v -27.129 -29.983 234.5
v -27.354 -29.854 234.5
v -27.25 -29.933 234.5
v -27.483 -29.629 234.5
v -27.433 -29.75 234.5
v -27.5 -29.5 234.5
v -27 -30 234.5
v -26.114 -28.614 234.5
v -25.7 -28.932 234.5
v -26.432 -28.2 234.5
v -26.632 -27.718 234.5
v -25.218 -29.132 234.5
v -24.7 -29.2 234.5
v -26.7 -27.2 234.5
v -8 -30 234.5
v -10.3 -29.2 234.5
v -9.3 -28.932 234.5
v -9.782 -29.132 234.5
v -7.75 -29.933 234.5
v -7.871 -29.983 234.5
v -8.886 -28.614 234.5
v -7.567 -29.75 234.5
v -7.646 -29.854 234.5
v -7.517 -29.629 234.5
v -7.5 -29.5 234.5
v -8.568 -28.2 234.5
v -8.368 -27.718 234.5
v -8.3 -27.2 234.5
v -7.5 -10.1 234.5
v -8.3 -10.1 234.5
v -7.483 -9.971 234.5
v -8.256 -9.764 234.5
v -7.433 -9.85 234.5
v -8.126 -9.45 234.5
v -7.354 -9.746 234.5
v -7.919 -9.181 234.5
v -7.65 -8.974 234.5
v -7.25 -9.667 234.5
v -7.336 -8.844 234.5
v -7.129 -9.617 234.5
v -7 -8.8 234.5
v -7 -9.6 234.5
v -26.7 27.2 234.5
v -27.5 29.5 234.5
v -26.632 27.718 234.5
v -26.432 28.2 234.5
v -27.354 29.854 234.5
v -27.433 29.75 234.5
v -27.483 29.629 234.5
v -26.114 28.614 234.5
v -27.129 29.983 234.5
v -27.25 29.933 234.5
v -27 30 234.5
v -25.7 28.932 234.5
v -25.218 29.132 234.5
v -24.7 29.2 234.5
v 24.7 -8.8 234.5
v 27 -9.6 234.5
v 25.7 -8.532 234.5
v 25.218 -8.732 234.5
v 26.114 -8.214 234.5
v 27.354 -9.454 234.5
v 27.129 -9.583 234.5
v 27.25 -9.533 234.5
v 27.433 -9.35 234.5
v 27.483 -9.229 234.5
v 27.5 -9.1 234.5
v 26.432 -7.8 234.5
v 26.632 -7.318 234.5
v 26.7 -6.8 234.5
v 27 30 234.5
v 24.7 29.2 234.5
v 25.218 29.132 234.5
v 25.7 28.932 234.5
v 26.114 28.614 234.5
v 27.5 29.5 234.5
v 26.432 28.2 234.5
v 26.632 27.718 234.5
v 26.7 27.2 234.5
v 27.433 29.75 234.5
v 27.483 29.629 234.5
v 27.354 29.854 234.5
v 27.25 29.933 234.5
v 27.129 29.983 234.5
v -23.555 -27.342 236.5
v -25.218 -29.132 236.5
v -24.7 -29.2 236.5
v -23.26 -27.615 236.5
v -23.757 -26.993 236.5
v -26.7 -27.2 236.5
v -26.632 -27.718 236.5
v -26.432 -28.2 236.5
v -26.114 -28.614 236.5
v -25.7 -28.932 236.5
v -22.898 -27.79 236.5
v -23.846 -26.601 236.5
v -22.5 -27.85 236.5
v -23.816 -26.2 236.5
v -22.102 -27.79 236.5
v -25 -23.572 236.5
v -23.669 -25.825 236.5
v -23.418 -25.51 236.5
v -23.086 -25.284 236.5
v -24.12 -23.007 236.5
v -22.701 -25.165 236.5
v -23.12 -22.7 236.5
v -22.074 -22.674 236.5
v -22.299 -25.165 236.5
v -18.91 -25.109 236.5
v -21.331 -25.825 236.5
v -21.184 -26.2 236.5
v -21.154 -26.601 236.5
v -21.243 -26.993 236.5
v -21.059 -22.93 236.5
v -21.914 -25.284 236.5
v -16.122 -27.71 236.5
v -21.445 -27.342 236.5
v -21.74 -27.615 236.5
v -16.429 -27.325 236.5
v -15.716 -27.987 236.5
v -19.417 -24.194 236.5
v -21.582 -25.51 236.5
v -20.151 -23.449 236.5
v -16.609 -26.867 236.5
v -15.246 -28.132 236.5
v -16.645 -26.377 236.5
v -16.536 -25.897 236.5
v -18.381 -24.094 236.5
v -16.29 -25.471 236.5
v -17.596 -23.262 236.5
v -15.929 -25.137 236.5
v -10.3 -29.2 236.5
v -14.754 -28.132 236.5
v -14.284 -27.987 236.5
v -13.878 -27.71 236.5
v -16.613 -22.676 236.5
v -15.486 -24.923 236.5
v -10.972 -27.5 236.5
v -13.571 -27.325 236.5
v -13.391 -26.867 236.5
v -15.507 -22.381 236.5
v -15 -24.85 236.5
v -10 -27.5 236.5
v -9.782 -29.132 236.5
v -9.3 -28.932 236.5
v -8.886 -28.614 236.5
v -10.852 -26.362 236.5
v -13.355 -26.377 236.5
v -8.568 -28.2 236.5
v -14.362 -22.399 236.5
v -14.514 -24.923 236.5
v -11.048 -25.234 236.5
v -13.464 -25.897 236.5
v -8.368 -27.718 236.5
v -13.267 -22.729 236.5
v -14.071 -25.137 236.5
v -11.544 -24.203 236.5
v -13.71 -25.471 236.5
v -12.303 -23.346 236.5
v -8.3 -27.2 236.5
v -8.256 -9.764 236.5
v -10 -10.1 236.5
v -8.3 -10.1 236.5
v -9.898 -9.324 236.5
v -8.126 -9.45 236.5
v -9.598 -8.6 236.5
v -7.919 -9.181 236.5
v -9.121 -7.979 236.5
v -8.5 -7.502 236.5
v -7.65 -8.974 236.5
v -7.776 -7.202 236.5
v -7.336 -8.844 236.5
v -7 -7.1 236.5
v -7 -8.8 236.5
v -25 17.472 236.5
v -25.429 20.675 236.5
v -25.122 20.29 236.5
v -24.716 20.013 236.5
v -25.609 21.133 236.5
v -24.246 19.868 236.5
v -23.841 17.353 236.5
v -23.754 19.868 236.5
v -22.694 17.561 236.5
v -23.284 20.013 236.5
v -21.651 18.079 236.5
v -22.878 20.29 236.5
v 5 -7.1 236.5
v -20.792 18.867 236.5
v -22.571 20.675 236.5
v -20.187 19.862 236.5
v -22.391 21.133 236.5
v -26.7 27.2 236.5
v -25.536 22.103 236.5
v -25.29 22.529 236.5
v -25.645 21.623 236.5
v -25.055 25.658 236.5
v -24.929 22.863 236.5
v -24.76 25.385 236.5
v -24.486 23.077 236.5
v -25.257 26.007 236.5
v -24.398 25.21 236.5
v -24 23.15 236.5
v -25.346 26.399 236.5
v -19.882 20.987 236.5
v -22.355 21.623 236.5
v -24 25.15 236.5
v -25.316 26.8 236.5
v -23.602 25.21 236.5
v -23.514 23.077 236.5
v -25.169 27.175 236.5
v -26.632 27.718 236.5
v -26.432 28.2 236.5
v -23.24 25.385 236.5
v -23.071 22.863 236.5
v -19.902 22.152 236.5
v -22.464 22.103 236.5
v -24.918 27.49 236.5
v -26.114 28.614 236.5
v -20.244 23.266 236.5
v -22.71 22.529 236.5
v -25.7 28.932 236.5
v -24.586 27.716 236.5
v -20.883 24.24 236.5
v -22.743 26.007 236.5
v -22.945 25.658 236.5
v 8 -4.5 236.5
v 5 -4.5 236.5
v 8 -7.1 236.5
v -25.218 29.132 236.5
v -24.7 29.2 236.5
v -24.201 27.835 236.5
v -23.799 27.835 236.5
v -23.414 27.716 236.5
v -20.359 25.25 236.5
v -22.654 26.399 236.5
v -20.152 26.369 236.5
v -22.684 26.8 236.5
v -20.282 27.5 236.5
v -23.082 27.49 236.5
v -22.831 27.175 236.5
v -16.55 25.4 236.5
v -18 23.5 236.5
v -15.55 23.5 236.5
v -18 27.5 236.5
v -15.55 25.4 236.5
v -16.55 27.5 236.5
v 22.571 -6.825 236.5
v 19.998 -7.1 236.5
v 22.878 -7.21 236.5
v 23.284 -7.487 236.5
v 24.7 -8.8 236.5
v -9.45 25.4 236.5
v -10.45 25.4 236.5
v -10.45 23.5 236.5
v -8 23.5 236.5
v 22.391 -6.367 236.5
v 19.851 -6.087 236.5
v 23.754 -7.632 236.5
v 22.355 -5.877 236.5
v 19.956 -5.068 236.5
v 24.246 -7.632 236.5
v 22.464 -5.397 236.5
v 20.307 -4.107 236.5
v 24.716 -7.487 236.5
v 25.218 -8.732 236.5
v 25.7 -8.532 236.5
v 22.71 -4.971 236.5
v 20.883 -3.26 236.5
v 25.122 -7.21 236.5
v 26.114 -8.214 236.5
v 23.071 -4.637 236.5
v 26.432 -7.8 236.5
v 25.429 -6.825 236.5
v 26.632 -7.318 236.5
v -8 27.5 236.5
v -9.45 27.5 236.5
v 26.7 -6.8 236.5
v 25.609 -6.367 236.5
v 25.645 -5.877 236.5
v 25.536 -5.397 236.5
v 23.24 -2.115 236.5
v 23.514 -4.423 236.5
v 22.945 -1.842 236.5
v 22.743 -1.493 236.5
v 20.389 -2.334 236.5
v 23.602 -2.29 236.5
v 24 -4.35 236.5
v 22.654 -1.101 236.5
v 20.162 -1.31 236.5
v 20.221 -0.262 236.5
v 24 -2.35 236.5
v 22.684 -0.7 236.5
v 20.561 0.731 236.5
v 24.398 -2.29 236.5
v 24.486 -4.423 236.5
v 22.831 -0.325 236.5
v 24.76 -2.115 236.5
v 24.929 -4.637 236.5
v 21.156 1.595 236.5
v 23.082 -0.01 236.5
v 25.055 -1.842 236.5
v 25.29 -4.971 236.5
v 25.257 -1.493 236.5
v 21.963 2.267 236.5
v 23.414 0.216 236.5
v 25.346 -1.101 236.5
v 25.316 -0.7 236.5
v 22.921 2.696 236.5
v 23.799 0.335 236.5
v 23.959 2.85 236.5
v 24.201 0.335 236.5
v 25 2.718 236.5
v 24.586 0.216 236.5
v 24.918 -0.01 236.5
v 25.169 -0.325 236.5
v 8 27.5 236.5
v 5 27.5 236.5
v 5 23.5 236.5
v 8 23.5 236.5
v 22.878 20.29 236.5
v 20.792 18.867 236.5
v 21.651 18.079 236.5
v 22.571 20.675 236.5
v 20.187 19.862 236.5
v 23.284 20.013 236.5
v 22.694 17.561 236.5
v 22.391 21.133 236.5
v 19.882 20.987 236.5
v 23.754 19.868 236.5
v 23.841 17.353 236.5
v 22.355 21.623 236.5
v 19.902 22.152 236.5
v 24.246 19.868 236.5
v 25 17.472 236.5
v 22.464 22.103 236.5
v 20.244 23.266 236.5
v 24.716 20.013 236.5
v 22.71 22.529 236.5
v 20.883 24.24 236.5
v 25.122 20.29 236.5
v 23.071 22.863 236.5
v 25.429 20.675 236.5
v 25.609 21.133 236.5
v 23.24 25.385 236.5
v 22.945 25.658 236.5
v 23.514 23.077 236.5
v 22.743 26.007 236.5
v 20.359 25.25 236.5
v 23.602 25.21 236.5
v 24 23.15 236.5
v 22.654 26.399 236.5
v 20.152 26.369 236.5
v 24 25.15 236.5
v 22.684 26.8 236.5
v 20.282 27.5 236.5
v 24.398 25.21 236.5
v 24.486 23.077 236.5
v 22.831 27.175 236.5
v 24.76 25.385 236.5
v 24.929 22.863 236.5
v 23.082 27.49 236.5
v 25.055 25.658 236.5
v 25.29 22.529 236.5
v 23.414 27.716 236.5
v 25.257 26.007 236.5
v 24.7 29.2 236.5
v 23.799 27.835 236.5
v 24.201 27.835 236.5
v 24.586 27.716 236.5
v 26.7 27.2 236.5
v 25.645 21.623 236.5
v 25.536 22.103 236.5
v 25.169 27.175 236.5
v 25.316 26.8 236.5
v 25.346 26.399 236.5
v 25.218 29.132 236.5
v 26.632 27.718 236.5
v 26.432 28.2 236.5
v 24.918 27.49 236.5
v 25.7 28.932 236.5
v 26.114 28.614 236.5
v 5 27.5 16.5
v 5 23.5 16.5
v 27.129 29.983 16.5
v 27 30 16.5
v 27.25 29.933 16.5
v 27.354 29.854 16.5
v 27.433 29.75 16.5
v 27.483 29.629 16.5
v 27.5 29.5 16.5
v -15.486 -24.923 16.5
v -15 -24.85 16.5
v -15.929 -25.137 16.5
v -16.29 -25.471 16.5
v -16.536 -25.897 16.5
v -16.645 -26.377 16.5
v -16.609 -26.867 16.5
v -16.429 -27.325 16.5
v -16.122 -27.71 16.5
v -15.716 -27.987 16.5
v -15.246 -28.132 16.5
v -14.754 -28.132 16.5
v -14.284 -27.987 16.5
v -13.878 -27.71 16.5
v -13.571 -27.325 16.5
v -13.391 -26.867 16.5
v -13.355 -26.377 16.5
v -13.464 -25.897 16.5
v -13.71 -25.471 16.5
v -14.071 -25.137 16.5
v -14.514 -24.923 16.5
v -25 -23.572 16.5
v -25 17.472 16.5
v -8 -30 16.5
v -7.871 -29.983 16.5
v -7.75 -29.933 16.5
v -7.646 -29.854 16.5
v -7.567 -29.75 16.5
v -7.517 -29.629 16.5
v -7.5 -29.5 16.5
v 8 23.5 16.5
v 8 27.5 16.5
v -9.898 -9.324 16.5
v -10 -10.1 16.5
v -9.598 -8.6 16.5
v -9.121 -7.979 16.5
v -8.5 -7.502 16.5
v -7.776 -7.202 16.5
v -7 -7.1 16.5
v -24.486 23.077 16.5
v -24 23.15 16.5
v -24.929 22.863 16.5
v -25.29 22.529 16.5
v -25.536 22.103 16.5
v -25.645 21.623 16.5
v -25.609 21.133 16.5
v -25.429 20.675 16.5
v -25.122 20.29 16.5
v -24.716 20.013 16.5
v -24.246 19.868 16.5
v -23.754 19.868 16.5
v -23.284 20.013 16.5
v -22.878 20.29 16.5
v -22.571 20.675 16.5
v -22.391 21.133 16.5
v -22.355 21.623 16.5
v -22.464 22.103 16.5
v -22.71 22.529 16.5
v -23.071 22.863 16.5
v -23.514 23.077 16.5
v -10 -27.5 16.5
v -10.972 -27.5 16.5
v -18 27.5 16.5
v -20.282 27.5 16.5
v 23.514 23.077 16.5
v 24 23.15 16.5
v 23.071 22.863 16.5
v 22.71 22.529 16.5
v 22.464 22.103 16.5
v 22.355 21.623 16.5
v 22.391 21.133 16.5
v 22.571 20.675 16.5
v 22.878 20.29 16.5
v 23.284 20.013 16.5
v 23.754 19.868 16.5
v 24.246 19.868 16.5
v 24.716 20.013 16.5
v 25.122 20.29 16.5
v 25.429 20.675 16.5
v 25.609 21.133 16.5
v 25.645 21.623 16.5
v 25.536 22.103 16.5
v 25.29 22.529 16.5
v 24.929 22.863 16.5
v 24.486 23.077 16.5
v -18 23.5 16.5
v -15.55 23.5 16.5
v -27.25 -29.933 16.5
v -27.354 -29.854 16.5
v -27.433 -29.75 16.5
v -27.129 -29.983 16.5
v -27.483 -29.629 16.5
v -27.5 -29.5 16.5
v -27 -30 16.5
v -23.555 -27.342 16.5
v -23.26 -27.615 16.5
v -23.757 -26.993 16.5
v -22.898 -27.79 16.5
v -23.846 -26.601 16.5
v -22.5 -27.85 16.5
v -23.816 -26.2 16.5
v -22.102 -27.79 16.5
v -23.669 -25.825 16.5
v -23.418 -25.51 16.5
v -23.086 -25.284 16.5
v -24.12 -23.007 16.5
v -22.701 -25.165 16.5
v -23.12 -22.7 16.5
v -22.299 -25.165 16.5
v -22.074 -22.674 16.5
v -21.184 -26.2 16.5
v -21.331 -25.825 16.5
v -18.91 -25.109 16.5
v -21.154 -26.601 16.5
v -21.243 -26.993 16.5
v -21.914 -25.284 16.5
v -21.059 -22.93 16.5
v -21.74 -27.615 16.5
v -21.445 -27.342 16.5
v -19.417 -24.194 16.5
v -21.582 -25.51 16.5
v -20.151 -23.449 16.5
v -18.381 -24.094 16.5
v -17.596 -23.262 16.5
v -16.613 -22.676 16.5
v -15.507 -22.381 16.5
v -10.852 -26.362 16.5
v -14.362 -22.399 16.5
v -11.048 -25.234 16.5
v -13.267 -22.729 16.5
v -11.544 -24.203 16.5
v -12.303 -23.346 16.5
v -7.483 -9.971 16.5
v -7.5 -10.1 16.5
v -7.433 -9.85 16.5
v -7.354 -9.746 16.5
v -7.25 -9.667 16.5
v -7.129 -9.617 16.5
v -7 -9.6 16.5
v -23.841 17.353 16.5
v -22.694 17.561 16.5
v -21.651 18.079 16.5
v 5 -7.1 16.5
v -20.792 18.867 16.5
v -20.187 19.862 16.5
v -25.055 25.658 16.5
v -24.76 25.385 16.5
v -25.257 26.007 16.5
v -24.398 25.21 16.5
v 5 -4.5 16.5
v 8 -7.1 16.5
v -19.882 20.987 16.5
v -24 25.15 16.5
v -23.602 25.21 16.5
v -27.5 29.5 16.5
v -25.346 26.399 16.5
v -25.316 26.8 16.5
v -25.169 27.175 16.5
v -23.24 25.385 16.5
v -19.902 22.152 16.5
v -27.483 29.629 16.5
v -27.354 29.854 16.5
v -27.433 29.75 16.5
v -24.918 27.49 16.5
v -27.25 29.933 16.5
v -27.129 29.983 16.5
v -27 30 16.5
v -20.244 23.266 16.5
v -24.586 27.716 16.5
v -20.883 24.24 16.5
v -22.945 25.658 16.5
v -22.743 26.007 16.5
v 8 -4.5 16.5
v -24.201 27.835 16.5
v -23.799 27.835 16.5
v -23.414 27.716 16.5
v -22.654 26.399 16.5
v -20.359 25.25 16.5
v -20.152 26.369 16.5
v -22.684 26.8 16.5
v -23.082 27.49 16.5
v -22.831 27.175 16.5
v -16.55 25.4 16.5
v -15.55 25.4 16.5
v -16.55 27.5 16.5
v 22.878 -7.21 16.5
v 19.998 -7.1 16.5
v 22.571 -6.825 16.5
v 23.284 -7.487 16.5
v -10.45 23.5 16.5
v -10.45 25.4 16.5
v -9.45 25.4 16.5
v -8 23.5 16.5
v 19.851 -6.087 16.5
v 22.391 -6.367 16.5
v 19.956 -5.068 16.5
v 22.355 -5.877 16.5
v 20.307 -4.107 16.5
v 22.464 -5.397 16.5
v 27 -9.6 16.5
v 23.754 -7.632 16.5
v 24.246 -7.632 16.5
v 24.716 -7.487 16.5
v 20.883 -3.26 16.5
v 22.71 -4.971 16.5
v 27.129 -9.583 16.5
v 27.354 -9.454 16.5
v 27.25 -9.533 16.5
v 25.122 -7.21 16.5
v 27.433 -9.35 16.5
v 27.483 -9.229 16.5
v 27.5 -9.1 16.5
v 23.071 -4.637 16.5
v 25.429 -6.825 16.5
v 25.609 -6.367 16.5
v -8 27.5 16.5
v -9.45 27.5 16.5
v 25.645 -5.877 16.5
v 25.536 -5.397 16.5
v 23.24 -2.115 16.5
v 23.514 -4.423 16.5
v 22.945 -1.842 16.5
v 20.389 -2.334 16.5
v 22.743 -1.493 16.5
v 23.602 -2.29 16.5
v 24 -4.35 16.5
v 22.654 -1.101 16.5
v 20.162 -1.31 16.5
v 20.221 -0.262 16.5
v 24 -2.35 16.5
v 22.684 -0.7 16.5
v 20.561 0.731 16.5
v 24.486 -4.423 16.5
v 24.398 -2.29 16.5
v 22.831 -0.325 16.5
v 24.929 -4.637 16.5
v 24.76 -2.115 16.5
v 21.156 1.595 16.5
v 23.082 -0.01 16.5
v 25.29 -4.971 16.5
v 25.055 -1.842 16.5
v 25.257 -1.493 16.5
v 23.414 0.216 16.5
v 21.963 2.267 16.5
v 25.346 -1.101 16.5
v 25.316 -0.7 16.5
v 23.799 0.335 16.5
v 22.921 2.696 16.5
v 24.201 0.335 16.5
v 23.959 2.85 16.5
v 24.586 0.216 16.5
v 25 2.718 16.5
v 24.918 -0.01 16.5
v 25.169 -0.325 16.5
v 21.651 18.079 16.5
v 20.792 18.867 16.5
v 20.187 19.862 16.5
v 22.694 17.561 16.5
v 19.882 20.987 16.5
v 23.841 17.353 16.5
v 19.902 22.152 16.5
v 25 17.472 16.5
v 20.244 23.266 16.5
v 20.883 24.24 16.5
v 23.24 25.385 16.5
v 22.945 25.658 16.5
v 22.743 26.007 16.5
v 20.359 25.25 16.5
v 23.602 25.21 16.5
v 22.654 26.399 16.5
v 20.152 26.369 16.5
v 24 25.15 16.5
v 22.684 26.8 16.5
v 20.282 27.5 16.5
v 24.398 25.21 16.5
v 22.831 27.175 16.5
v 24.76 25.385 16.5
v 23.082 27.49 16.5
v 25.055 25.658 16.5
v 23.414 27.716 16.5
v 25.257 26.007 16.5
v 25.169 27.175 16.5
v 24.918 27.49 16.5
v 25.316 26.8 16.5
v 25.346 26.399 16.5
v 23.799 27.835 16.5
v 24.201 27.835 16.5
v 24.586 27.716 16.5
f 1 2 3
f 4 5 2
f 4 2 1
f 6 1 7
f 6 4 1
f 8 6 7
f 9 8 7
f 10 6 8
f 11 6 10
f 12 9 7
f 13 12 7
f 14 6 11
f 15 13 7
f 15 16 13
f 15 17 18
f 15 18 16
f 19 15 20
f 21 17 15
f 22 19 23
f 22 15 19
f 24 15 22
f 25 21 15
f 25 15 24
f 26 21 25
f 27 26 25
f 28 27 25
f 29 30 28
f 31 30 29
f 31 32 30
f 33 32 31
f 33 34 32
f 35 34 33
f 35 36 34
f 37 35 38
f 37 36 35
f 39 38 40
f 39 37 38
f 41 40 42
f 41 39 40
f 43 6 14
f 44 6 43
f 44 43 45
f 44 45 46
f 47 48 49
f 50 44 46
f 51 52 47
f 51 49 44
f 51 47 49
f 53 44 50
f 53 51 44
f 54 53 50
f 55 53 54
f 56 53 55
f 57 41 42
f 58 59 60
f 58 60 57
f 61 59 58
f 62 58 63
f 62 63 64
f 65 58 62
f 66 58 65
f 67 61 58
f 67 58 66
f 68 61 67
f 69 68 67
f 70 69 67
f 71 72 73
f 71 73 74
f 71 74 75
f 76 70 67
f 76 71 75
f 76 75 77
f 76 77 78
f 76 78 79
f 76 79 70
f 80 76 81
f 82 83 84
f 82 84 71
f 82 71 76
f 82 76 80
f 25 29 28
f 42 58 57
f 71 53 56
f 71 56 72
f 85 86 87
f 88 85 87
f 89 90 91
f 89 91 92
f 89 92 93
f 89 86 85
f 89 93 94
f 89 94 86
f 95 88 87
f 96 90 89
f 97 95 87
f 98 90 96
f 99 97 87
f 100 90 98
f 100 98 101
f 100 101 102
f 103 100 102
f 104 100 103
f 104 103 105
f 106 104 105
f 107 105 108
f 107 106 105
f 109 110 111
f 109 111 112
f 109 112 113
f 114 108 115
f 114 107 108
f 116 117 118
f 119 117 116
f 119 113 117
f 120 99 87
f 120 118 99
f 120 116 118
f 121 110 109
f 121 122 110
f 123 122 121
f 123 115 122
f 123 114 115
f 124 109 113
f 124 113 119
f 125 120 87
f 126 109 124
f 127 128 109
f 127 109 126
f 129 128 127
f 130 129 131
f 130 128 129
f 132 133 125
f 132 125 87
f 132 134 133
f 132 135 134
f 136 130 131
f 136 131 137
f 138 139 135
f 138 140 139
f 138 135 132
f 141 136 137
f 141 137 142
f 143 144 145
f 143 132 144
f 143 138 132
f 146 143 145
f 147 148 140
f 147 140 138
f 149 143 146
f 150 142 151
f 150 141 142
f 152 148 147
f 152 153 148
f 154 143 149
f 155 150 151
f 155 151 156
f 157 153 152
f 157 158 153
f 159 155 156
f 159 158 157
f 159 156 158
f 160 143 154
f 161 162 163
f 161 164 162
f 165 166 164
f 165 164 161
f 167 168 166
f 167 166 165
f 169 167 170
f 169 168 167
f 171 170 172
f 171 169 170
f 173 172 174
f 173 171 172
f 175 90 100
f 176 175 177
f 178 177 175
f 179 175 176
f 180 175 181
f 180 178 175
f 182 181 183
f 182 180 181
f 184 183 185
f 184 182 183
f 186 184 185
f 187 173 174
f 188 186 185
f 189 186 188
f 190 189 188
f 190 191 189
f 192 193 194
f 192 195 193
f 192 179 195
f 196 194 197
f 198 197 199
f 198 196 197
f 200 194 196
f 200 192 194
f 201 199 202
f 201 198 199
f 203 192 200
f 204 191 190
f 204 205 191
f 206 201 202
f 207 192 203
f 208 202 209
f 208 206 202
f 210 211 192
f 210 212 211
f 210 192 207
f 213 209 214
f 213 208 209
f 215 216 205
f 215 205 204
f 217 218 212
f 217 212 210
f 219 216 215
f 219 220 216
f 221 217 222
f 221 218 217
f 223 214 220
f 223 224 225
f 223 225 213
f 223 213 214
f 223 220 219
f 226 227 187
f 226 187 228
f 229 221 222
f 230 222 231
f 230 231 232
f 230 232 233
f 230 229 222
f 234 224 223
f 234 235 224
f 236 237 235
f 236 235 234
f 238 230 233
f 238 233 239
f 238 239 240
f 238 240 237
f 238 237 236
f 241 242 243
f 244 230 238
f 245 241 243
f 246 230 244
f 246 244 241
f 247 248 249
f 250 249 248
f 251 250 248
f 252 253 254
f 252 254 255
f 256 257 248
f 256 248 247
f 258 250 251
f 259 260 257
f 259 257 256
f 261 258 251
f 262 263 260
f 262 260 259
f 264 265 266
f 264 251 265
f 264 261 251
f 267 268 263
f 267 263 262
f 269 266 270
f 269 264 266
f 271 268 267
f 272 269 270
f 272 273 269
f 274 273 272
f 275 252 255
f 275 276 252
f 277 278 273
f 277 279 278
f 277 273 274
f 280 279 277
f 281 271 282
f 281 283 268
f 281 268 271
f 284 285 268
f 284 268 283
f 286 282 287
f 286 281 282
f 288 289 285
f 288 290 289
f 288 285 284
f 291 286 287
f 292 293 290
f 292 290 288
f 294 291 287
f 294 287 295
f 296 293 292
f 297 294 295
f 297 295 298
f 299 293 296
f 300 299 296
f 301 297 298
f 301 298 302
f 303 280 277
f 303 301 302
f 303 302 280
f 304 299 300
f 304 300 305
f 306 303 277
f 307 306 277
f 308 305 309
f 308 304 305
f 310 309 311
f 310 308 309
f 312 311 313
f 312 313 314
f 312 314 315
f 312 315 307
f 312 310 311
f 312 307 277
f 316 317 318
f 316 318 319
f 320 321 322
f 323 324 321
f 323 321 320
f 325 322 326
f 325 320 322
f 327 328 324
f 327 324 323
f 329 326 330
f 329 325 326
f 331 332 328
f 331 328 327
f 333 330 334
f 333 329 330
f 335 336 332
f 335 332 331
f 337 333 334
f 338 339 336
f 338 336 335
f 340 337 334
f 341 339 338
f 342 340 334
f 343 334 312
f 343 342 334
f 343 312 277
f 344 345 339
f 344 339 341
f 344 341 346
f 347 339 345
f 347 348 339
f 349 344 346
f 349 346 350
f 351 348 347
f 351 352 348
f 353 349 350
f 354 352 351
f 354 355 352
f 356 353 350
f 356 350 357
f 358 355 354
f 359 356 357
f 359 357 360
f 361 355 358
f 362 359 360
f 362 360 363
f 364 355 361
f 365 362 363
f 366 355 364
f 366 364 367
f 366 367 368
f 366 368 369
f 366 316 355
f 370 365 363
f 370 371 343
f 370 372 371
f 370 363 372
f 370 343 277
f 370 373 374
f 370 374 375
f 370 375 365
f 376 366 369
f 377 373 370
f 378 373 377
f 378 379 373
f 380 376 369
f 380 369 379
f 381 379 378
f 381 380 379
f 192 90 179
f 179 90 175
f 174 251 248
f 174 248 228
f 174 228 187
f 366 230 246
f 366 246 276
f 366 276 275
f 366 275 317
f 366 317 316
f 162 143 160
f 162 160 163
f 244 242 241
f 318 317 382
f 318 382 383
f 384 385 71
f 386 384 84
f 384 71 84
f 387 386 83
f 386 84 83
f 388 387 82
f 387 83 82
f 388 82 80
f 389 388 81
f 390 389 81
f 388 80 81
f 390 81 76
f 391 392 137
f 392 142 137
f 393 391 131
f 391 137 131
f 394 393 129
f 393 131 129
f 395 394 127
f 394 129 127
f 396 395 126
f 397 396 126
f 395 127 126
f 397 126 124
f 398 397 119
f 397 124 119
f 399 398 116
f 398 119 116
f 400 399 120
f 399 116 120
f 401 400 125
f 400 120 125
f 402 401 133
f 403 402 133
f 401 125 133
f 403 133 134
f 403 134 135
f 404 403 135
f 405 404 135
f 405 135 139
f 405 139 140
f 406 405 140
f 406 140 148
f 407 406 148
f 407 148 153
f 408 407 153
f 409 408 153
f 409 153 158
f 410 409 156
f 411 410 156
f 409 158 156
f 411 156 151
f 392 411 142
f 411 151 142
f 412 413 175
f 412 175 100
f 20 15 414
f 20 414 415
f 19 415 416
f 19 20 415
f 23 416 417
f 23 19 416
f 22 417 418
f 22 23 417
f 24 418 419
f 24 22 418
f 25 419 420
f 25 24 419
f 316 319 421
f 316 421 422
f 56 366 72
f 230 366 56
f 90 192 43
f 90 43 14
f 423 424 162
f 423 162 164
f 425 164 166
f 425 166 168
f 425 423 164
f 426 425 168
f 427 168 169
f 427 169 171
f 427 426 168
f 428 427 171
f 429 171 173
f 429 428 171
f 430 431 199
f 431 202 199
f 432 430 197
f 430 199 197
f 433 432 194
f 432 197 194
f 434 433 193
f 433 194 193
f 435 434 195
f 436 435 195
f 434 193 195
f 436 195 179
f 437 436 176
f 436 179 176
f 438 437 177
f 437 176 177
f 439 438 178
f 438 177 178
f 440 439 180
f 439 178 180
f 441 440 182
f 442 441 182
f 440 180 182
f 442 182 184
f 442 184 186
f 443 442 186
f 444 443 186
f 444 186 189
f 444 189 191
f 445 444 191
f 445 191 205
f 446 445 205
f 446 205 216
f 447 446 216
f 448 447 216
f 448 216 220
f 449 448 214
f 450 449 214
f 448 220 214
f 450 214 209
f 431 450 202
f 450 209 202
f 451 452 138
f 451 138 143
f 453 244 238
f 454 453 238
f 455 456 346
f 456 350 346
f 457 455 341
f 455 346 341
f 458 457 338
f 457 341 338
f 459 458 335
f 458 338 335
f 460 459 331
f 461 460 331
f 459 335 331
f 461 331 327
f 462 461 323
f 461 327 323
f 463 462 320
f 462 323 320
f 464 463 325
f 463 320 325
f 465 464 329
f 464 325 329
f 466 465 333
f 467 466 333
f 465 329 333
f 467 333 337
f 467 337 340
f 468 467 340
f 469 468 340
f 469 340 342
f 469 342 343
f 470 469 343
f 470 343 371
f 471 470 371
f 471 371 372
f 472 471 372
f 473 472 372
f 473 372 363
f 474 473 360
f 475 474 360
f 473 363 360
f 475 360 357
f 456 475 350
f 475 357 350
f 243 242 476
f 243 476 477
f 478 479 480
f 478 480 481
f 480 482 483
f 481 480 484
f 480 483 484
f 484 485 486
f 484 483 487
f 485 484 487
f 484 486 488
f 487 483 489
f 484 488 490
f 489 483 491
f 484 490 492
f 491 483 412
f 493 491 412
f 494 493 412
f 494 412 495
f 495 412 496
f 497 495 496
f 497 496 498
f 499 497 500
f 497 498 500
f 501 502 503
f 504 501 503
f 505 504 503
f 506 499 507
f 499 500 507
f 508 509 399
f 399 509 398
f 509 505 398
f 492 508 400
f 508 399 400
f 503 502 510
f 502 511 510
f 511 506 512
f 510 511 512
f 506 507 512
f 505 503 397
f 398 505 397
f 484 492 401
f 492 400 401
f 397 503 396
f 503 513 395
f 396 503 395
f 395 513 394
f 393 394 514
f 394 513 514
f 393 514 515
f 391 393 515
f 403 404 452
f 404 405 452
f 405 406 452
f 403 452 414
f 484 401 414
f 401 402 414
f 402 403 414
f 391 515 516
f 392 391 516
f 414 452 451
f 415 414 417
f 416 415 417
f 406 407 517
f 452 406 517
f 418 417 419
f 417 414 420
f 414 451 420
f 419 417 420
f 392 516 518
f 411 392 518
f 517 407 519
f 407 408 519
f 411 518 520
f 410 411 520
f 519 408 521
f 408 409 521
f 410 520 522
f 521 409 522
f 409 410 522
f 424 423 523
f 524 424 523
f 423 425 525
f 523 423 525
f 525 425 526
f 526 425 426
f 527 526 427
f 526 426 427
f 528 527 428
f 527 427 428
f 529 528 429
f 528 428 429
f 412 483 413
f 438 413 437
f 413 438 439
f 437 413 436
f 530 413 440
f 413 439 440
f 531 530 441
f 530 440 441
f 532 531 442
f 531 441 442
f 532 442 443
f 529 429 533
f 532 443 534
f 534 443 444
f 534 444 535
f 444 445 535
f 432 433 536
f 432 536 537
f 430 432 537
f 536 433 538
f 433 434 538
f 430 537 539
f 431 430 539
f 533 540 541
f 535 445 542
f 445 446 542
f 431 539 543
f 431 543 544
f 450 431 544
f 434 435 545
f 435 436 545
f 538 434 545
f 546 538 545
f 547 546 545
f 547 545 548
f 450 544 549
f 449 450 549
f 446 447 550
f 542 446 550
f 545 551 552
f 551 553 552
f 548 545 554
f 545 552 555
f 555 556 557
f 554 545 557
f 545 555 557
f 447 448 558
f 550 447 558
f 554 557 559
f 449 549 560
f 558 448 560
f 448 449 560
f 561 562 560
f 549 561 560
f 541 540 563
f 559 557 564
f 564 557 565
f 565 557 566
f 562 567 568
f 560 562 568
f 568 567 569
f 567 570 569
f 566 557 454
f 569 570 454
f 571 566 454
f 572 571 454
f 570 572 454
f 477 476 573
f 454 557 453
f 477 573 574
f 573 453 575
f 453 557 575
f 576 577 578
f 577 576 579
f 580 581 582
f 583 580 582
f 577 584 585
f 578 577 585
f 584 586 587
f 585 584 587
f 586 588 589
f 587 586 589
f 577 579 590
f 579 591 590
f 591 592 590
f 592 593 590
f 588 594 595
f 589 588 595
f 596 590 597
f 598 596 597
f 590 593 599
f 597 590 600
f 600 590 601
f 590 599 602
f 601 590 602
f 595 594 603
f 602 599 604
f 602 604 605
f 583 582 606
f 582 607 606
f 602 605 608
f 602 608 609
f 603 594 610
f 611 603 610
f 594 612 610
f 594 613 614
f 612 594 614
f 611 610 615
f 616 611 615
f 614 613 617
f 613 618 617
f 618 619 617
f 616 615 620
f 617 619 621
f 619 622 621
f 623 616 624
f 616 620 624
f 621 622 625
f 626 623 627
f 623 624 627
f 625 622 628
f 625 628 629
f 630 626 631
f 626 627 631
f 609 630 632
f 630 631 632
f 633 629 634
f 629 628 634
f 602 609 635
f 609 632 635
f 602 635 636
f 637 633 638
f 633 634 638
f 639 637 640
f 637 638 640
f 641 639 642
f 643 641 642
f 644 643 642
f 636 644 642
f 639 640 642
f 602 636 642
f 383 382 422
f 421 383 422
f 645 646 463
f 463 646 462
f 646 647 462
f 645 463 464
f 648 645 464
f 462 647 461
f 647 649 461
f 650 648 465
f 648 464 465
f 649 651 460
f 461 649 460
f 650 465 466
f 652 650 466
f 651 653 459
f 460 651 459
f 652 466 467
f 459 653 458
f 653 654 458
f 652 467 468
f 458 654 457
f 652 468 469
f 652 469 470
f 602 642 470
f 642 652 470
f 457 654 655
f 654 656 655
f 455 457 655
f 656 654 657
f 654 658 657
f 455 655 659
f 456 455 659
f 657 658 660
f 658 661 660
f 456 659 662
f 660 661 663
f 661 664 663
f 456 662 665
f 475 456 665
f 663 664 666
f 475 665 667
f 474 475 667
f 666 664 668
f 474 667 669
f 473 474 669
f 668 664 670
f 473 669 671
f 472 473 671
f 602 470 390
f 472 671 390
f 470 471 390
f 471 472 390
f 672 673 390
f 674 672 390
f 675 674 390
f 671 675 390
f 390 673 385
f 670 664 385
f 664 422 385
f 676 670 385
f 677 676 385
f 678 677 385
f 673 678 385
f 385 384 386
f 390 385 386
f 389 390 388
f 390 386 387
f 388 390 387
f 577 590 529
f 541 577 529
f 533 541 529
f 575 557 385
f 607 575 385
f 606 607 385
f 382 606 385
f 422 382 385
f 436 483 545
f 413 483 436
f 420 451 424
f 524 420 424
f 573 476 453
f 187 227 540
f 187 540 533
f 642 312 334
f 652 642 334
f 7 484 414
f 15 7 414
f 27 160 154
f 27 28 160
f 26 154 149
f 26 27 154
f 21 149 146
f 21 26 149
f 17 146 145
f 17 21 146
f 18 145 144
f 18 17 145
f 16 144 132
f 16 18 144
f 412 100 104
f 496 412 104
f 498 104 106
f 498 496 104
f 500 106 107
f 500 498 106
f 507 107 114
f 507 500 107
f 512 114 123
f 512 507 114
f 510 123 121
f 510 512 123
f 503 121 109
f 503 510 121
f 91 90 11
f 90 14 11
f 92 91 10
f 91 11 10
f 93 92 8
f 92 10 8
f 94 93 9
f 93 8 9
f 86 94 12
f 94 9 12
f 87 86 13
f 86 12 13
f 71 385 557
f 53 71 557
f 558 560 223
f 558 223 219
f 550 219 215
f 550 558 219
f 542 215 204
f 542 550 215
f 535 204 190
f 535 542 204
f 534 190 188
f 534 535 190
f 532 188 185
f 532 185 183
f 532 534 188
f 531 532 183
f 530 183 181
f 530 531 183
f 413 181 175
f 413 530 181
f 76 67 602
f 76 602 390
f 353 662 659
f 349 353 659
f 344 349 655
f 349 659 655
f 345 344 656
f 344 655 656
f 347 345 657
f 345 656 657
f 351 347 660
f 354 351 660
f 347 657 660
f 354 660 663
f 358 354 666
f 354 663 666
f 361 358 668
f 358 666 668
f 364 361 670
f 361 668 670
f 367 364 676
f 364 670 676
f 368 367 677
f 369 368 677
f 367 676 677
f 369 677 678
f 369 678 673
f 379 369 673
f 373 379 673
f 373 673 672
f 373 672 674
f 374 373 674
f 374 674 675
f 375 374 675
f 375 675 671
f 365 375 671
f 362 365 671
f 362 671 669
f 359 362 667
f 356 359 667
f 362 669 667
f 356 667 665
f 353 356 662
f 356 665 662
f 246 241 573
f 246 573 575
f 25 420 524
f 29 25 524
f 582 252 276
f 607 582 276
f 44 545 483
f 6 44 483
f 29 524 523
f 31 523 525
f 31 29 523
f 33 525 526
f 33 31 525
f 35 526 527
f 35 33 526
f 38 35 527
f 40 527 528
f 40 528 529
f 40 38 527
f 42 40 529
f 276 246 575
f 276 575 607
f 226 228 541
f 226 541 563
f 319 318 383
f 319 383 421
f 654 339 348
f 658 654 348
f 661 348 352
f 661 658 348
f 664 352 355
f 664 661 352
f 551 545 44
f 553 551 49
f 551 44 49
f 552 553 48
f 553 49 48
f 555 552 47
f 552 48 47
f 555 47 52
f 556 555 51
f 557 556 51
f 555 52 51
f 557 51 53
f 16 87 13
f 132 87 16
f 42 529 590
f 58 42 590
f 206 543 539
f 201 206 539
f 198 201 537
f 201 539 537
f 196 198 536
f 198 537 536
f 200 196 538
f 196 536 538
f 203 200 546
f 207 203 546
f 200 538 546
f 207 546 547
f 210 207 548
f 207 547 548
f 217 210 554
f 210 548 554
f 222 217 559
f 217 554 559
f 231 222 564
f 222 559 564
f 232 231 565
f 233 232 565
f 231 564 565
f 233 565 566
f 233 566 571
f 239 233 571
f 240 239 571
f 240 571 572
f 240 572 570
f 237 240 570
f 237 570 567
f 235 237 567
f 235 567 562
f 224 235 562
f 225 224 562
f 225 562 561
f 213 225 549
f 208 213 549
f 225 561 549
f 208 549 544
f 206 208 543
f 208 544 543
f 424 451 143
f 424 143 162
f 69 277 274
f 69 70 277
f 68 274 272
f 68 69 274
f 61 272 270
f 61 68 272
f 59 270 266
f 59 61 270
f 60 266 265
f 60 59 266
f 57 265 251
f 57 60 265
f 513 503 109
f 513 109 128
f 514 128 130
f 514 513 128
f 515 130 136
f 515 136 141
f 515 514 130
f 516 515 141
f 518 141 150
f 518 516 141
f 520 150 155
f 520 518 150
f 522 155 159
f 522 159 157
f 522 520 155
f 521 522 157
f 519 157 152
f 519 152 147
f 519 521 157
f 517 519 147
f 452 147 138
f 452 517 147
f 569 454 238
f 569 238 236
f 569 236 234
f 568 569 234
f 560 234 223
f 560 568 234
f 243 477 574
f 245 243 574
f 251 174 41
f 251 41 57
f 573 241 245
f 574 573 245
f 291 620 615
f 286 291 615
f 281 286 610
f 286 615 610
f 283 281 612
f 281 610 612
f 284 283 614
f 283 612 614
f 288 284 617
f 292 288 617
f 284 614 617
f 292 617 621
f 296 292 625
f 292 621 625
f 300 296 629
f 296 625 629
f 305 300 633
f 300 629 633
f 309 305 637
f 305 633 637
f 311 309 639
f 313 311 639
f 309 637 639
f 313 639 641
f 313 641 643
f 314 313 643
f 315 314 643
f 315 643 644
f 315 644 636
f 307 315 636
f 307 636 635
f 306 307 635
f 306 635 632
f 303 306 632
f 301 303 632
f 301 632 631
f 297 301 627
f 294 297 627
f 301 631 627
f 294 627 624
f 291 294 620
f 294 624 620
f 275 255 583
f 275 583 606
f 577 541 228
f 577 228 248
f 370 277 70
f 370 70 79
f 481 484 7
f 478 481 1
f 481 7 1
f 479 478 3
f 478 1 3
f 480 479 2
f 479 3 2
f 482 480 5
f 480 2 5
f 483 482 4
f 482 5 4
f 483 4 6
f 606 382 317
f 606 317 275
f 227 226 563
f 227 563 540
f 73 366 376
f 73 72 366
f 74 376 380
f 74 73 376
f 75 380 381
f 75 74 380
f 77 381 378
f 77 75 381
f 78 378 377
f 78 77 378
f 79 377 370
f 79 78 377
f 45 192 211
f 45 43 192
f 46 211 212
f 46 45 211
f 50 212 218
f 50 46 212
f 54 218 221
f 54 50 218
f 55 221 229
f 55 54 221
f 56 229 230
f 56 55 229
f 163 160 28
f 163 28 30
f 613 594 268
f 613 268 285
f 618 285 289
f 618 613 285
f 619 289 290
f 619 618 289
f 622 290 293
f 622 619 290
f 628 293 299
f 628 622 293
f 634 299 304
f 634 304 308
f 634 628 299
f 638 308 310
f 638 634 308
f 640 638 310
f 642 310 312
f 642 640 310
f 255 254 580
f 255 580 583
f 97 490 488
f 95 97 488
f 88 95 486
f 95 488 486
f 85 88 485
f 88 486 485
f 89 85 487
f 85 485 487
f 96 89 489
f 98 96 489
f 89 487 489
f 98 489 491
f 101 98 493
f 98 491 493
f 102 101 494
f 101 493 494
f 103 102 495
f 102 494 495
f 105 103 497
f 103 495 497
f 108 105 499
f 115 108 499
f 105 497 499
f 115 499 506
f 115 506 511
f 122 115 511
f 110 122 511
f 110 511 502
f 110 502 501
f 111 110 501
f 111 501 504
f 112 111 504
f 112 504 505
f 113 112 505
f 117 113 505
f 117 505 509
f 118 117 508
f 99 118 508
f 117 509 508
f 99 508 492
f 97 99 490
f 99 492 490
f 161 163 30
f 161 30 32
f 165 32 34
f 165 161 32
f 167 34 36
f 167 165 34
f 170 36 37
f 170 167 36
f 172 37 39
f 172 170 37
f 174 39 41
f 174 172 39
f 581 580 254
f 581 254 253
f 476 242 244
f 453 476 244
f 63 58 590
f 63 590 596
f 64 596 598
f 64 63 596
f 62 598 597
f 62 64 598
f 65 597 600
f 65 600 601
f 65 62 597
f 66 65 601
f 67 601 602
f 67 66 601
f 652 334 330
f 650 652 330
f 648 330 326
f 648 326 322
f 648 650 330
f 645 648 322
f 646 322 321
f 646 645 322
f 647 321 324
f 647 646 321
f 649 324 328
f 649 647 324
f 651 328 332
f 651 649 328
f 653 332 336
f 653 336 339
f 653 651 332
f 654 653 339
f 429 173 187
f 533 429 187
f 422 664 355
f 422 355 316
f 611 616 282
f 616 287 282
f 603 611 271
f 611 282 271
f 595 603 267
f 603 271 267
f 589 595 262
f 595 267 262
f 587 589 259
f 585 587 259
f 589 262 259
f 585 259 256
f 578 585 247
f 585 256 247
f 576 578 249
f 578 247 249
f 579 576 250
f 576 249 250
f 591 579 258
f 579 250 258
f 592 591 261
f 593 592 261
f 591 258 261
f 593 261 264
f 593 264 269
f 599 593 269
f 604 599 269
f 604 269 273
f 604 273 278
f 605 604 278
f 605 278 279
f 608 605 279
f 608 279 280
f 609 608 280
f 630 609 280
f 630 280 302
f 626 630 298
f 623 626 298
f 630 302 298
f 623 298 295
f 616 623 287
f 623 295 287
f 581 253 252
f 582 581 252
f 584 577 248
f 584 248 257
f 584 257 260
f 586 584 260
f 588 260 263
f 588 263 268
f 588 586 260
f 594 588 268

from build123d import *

# Parameters (mm, degrees)
SKETCH_1_W                       = 55
SKETCH_1_H                       = 60
EXTRUDE_1_DEPTH                  = 16.5
HOLE_WIZARD_3_6_3_6_1_D          = 3.6
HOLE_WIZARD_3_6_3_6_1_DEPTH      = 25
HOLE_WIZARD_3_6_3_6_1_TIP        = 1.081549114
HOLE_WIZARD_M2_5_1_D             = 2.05
HOLE_WIZARD_M2_5_1_DEPTH         = 14
HOLE_WIZARD_M2_5_1_TIP           = 0.615882135
SKETCH_8_W                       = 35
SKETCH_8_H                       = 20.4
CUT_EXTRUDE_1_DEPTH              = 44.914690025
CUT_EXTRUDE_START                = 2.5
SKETCH_9_W                       = 20
SKETCH_9_H                       = 6
CUT_EXTRUDE_2_DEPTH              = 42.414690025
SHELL_START                      = 1.8
SHELL_1_DEPTH                    = 14.7
EXTRUDE_2_DEPTH                  = 220
HOLE_WIZARD_1_AT_2_COUNT         = 2
HOLE_WIZARD_1_AT_2_PITCH         = 48
HOLE_WIZARD_1_AT_3_COUNT         = 2
HOLE_WIZARD_1_AT_3_PITCH         = 27.5
HOLE_WIZARD_1_AT_4_COUNT         = 2
HOLE_WIZARD_1_AT_4_PITCH         = 70.507091842
SKETCH_16_R                      = 3
CUT_EXTRUDE_4_DEPTH              = 12
FILLET_1_R                       = 0.5
FILLET_2_R                       = 0.5
SKETCH_20_W                      = 1.65
SKETCH_20_H                      = 220
HOLE_WIZARD_M4_1_AT_2_COUNT      = 2
HOLE_WIZARD_M4_1_AT_2_PITCH      = 27.5
HOLE_WIZARD_M4_1_AT_3_COUNT      = 2
HOLE_WIZARD_M4_1_AT_3_PITCH      = 61.846584384
HOLE_WIZARD_M4_1_AT_4_COUNT      = 2
HOLE_WIZARD_M4_1_AT_4_PITCH      = 48
SKETCH_22_W                      = 1.35
SKETCH_22_H                      = 236.5
HOLE_WIZARD_2_7_2_7_1_AT_2_COUNT = 2
HOLE_WIZARD_2_7_2_7_1_AT_2_PITCH = 27.5
HOLE_WIZARD_2_7_2_7_1_AT_3_COUNT = 2
HOLE_WIZARD_2_7_2_7_1_AT_3_PITCH = 48
HOLE_WIZARD_2_7_2_7_1_AT_4_COUNT = 2
HOLE_WIZARD_2_7_2_7_1_AT_4_PITCH = 70.507091842
SHELL_START_2                    = 16.5
SHELL_2_DEPTH                    = 220
EXTRUDE_1_2_DEPTH                = 220
SKETCH_25_W                      = 10
SKETCH_25_H                      = 4
EXTRUDE_3_DEPTH                  = 220
SKETCH_26_W                      = 7.1
SKETCH_26_H                      = 2.1
CUT_EXTRUDE_5_DEPTH              = 224.732541218
CUT_EXTRUDE_1_2_DEPTH            = 224.732541218
CUT_EXTRUDE_1_2_DEPTH_BACK       = 224.732541218
SKETCH_27_W                      = 5.1
SKETCH_27_H                      = 2.702569417
SKETCH_28_R                      = 75.950047439
CUT_EXTRUDE_6_DEPTH              = 2
FILLET_3_R                       = 2


# Read off the part's stored shape, not the designer's step: 抽壳1, 抽壳2
with BuildPart() as part:
    # 草图1 → Extrude 1 (new body)
    with BuildSketch(Plane.XY):
        Rectangle(SKETCH_1_W, SKETCH_1_H)
    extrude(amount=EXTRUDE_1_DEPTH)

    # Ø3.6 (3.6) 直径孔1
    with Locations(Plane.XY.offset(16.5)):
        with Locations((-24, 21.5), (24, 21.5), (24, -6), (-15, -26.5)):
            Hole(HOLE_WIZARD_3_6_3_6_1_D / 2, depth=HOLE_WIZARD_3_6_3_6_1_DEPTH)
            with Locations((0, 0, -(HOLE_WIZARD_3_6_3_6_1_DEPTH + HOLE_WIZARD_3_6_3_6_1_TIP / 2))):  # 118° drill point
                Cone(0, HOLE_WIZARD_3_6_3_6_1_D / 2, HOLE_WIZARD_3_6_3_6_1_TIP, mode=Mode.SUBTRACT)

    # M2.5 螺纹孔1
    with Locations(Plane.XY.offset(16.5)):
        with Locations((-24, 26.5), (24, 26.5), (24, -1), (-22.5, -26.5)):
            Hole(HOLE_WIZARD_M2_5_1_D / 2, depth=HOLE_WIZARD_M2_5_1_DEPTH)
            with Locations((0, 0, -(HOLE_WIZARD_M2_5_1_DEPTH + HOLE_WIZARD_M2_5_1_TIP / 2))):  # 118° drill point
                Cone(0, HOLE_WIZARD_M2_5_1_D / 2, HOLE_WIZARD_M2_5_1_TIP, mode=Mode.SUBTRACT)

    # 草图8 → Cut-Extrude 1 (cut, through all)
    with BuildSketch(Plane.XY.offset(16.5)):
        with Locations((10, -19.8)):
            Rectangle(SKETCH_8_W, SKETCH_8_H)
    extrude(amount=-CUT_EXTRUDE_1_DEPTH, mode=Mode.SUBTRACT)

    # 草图9 → 切除-拉伸2 (cut, through all)
    with BuildSketch(Plane(origin=(0, 0, 16.5), x_dir=(-1, 0, 0), z_dir=(0, 0, -1)).offset(CUT_EXTRUDE_START)):
        with Locations((17.5, -27)):
            Rectangle(SKETCH_9_W, SKETCH_9_H)
    extrude(amount=CUT_EXTRUDE_2_DEPTH, mode=Mode.SUBTRACT)

    # 抽壳1 outline → 抽壳1 (cut)
    with BuildSketch(Plane.XY.offset(SHELL_START)):
        with BuildLine():
            ThreePointArc((-21.743758657, 28.2), (-21.182110509, 26.299690696), (-22.006919283, 24.4979375))
            ThreePointArc((-22.006919283, 24.4979375), (-20.910890356, 19.651378458), (-25.7, 18.326673669))
            Line((-25.7, 18.326673669), (-25.7, -22.2))
            Line((-25.7, -22.2), (-9.3, -22.2))
            Line((-9.3, -22.2), (-9.3, -7.8))
            Line((-9.3, -7.8), (20.882308546, -7.8))
            ThreePointArc((20.882308546, -7.8), (20.494996561, -5.178446051), (22.006919283, -3.0020625))
            ThreePointArc((22.006919283, -3.0020625), (21.865811165, 0.8509087), (25.7, 1.256241343))
            Line((25.7, 1.256241343), (25.7, 18.326673669))
            ThreePointArc((25.7, 18.326673669), (20.910890356, 19.651378458), (22.006919283, 24.4979375))
            ThreePointArc((22.006919283, 24.4979375), (21.182110509, 26.299690696), (21.743758657, 28.2))
            Line((21.743758657, 28.2), (-21.743758657, 28.2))
        make_face()
    extrude(amount=SHELL_1_DEPTH, mode=Mode.SUBTRACT)


with BuildPart() as body_2:
    # 草图10 → 凸台-拉伸2 (new body)
    with BuildSketch(Plane.XY.offset(16.5)):
        Polygon((-27.5, -30), (-7.5, -30), (-7.5, -9.6), (27.5, -9.6), (27.5, 30), (-27.5, 30), align=None)
    extrude(amount=EXTRUDE_2_DEPTH)


with BuildPart() as hole_wizard_1_tool:
    # 草图13 → 打孔尺寸(%根据)内六角圆柱头螺钉的类型1 (revolve)
    with BuildSketch(Plane(origin=(24, 26.5, 236.5), x_dir=(0, -1, 0), z_dir=(1, 0, 0))):
        Polygon((0, 0), (0, 236.5), (1, 236.5), (1, 1.5), (1.05, 1.5), (1.05, 0), align=None)
    hole_wizard_1 = revolve(axis=Axis((24, 26.5, 242.85), (0, 0, -1)))


with BuildPart() as part_1:
    add(part.part)

    # 打孔尺寸(%根据)内六角圆柱头螺钉的类型1: cut by hole_wizard_1_tool
    add(hole_wizard_1_tool.part, mode=Mode.SUBTRACT)


with BuildPart() as body_2_1:
    add(body_2.part)

    # 打孔尺寸(%根据)内六角圆柱头螺钉的类型1: cut by hole_wizard_1_tool
    add(hole_wizard_1_tool.part, mode=Mode.SUBTRACT)


with BuildPart() as hole_wizard_1_at_2_tool:
    # 打孔尺寸(%根据)内六角圆柱头螺钉的类型1 at 2: 打孔尺寸(%根据)内六角圆柱头螺钉的类型1 ×2
    with Locations(*[(-i * HOLE_WIZARD_1_AT_2_PITCH, 0, 0) for i in range(1, HOLE_WIZARD_1_AT_2_COUNT)]):
        add(hole_wizard_1)


with BuildPart() as part_2:
    add(part_1.part)

    # 打孔尺寸(%根据)内六角圆柱头螺钉的类型1 at 2: cut by hole_wizard_1_at_2_tool
    add(hole_wizard_1_at_2_tool.part, mode=Mode.SUBTRACT)


with BuildPart() as body_2_2:
    add(body_2_1.part)

    # 打孔尺寸(%根据)内六角圆柱头螺钉的类型1 at 2: cut by hole_wizard_1_at_2_tool
    add(hole_wizard_1_at_2_tool.part, mode=Mode.SUBTRACT)


with BuildPart() as hole_wizard_1_at_3_tool:
    # 打孔尺寸(%根据)内六角圆柱头螺钉的类型1 at 3: 打孔尺寸(%根据)内六角圆柱头螺钉的类型1 ×2
    with Locations(*[(0, -i * HOLE_WIZARD_1_AT_3_PITCH, 0) for i in range(1, HOLE_WIZARD_1_AT_3_COUNT)]):
        add(hole_wizard_1)


with BuildPart() as part_3:
    add(part_2.part)

    # 打孔尺寸(%根据)内六角圆柱头螺钉的类型1 at 3: cut by hole_wizard_1_at_3_tool
    add(hole_wizard_1_at_3_tool.part, mode=Mode.SUBTRACT)

    # 草图16 → 切除-拉伸4 (cut)
    with BuildSketch(Plane(origin=(-7.5, 0, 0), x_dir=(0, 0, -1), z_dir=(1, 0, 0))):
        with Locations(Location((-8, -18, 0), (0, 0, 90))):
            Circle(SKETCH_16_R)
    extrude(amount=-CUT_EXTRUDE_4_DEPTH, mode=Mode.SUBTRACT)

    # 圆角1
    fillet_1_edges = [part_3.edges().sort_by_distance(p)[0] for p in [
        (-27.5, 3, 0),
        (0, 30, 0),
        (27.5, 10.2, 0),
        (27.5, -9.6, 8.25),
        (-7.5, -16.8, 0),
        (10, -9.6, 0),
        (-7.5, -9.6, 8.25),
        (-7.5, -30, 15.25),
        (-27.5, -30, 15.25),
        (-27.5, 30, 8.25),
        (27.5, 30, 8.25),
        (-17.5, -24, 0),
        (-7.5, -24, 7),
        (-27.5, -24, 7),
    ]]
    fillet(fillet_1_edges, radius=FILLET_1_R)


with BuildPart() as body_2_3:
    add(body_2_2.part)

    # 打孔尺寸(%根据)内六角圆柱头螺钉的类型1 at 3: cut by hole_wizard_1_at_3_tool
    add(hole_wizard_1_at_3_tool.part, mode=Mode.SUBTRACT)

    # 打孔尺寸(%根据)内六角圆柱头螺钉的类型1 at 4: 打孔尺寸(%根据)内六角圆柱头螺钉的类型1 ×2
    with Locations(*[Vector(-0.6595081258531857, -0.7516974337681476, 0) * (i * HOLE_WIZARD_1_AT_4_PITCH) for i in range(1, HOLE_WIZARD_1_AT_4_COUNT)]):
        add(hole_wizard_1, mode=Mode.SUBTRACT)

    # 圆角2
    fillet_2_edges = [body_2_3.edges().sort_by_distance(p)[0] for p in [
        (-27.5, 30, 126.5),
        (27.5, 30, 126.5),
        (27.5, -9.6, 126.5),
        (-7.5, -9.6, 126.5),
        (-7.5, -30, 126.5),
        (-27.5, -30, 126.5),
    ]]
    fillet(fillet_2_edges, radius=FILLET_2_R)

    # 草图20 → M4 螺纹孔1 (revolve, cut)
    with BuildSketch(Plane(origin=(24, 21.5, 16.5), x_dir=(0, 1, 0), z_dir=(1, 0, 0))):
        with Locations((0.825, 110)):
            Rectangle(SKETCH_20_W, SKETCH_20_H)
    hole_wizard_m4_1 = revolve(axis=Axis((24, 21.5, 10.15), (0, 0, 1)), mode=Mode.SUBTRACT)

    # M4 螺纹孔1 at 2: M4 螺纹孔1 ×2
    with Locations(*[(0, -i * HOLE_WIZARD_M4_1_AT_2_PITCH, 0) for i in range(1, HOLE_WIZARD_M4_1_AT_2_COUNT)]):
        add(hole_wizard_m4_1, mode=Mode.SUBTRACT)

    # M4 螺纹孔1 at 3: M4 螺纹孔1 ×2
    with Locations(*[Vector(-0.6305926250944656, -0.7761140001162656, 0) * (i * HOLE_WIZARD_M4_1_AT_3_PITCH) for i in range(1, HOLE_WIZARD_M4_1_AT_3_COUNT)]):
        add(hole_wizard_m4_1, mode=Mode.SUBTRACT)

    # M4 螺纹孔1 at 4: M4 螺纹孔1 ×2
    with Locations(*[(-i * HOLE_WIZARD_M4_1_AT_4_PITCH, 0, 0) for i in range(1, HOLE_WIZARD_M4_1_AT_4_COUNT)]):
        add(hole_wizard_m4_1, mode=Mode.SUBTRACT)


with BuildPart() as hole_wizard_2_7_2_7_1_tool:
    # 草图22 → Ø2.7 (2.7) 直径孔1 (revolve)
    with BuildSketch(Plane(origin=(24, 26.5, 236.5), x_dir=(0, -1, 0), z_dir=(1, 0, 0))):
        with Locations((0.675, 118.25)):
            Rectangle(SKETCH_22_W, SKETCH_22_H)
    hole_wizard_2_7_2_7_1 = revolve(axis=Axis((24, 26.5, 242.85), (0, 0, -1)))


with BuildPart() as part_4:
    add(part_3.part)

    # Ø2.7 (2.7) 直径孔1: cut by hole_wizard_2_7_2_7_1_tool
    add(hole_wizard_2_7_2_7_1_tool.part, mode=Mode.SUBTRACT)


with BuildPart() as body_2_4:
    add(body_2_3.part)

    # Ø2.7 (2.7) 直径孔1: cut by hole_wizard_2_7_2_7_1_tool
    add(hole_wizard_2_7_2_7_1_tool.part, mode=Mode.SUBTRACT)


with BuildPart() as hole_wizard_2_7_2_7_1_at_2_tool:
    # Ø2.7 (2.7) 直径孔1 at 2: Ø2.7 (2.7) 直径孔1 ×2
    with Locations(*[(0, -i * HOLE_WIZARD_2_7_2_7_1_AT_2_PITCH, 0) for i in range(1, HOLE_WIZARD_2_7_2_7_1_AT_2_COUNT)]):
        add(hole_wizard_2_7_2_7_1)


with BuildPart() as part_5:
    add(part_4.part)

    # Ø2.7 (2.7) 直径孔1 at 2: cut by hole_wizard_2_7_2_7_1_at_2_tool
    add(hole_wizard_2_7_2_7_1_at_2_tool.part, mode=Mode.SUBTRACT)


with BuildPart() as body_2_5:
    add(body_2_4.part)

    # Ø2.7 (2.7) 直径孔1 at 2: cut by hole_wizard_2_7_2_7_1_at_2_tool
    add(hole_wizard_2_7_2_7_1_at_2_tool.part, mode=Mode.SUBTRACT)


with BuildPart() as hole_wizard_2_7_2_7_1_at_3_tool:
    # Ø2.7 (2.7) 直径孔1 at 3: Ø2.7 (2.7) 直径孔1 ×2
    with Locations(*[(-i * HOLE_WIZARD_2_7_2_7_1_AT_3_PITCH, 0, 0) for i in range(1, HOLE_WIZARD_2_7_2_7_1_AT_3_COUNT)]):
        add(hole_wizard_2_7_2_7_1)


with BuildPart() as part_6:
    add(part_5.part)

    # Ø2.7 (2.7) 直径孔1 at 3: cut by hole_wizard_2_7_2_7_1_at_3_tool
    add(hole_wizard_2_7_2_7_1_at_3_tool.part, mode=Mode.SUBTRACT)


with BuildPart() as body_2_6:
    add(body_2_5.part)

    # Ø2.7 (2.7) 直径孔1 at 3: cut by hole_wizard_2_7_2_7_1_at_3_tool
    add(hole_wizard_2_7_2_7_1_at_3_tool.part, mode=Mode.SUBTRACT)


with BuildPart() as hole_wizard_2_7_2_7_1_at_4_tool:
    # Ø2.7 (2.7) 直径孔1 at 4: Ø2.7 (2.7) 直径孔1 ×2
    with Locations(*[Vector(-0.6595081258531857, -0.7516974337681476, 0) * (i * HOLE_WIZARD_2_7_2_7_1_AT_4_PITCH) for i in range(1, HOLE_WIZARD_2_7_2_7_1_AT_4_COUNT)]):
        add(hole_wizard_2_7_2_7_1)


with BuildPart() as part_7:
    add(part_6.part)

    # Ø2.7 (2.7) 直径孔1 at 4: cut by hole_wizard_2_7_2_7_1_at_4_tool
    add(hole_wizard_2_7_2_7_1_at_4_tool.part, mode=Mode.SUBTRACT)


with BuildPart() as body_2_7:
    add(body_2_6.part)

    # Ø2.7 (2.7) 直径孔1 at 4: cut by hole_wizard_2_7_2_7_1_at_4_tool
    add(hole_wizard_2_7_2_7_1_at_4_tool.part, mode=Mode.SUBTRACT)

    # 抽壳2 outline → 抽壳2 (cut)
    with BuildSketch(Plane.XY.offset(SHELL_START_2)):
        with BuildLine():
            ThreePointArc((20.883126567, 24.24), (20.213800969, 25.802005085), (20.282137711, 27.5))
            Line((20.282137711, 27.5), (-20.282137711, 27.5))
            ThreePointArc((-20.282137711, 27.5), (-20.213800969, 25.802005085), (-20.883126567, 24.24))
            ThreePointArc((-20.883126567, 24.24), (-20.454469736, 19.343216481), (-25, 17.472283525))
            Line((-25, 17.472283525), (-25, -23.572116806))
            ThreePointArc((-25, -23.572116806), (-21.557842707, -22.767060189), (-18.91, -25.109172908))
            ThreePointArc((-18.91, -25.109172908), (-13.803138338, -22.526333914), (-10.972283525, -27.5))
            Line((-10.972283525, -27.5), (-10, -27.5))
            Line((-10, -27.5), (-10, -10.1))
            ThreePointArc((-10, -10.1), (-9.121320344, -7.978679656), (-7, -7.1))
            Line((-7, -7.1), (19.998437805, -7.1))
            ThreePointArc((19.998437805, -7.1), (19.955938743, -5.068298035), (20.883126567, -3.26))
            ThreePointArc((20.883126567, -3.26), (20.829196053, 1.183690072), (25, 2.717862289))
            Line((25, 2.717862289), (25, 17.472283525))
            ThreePointArc((25, 17.472283525), (20.454469736, 19.343216481), (20.883126567, 24.24))
        make_face()
    extrude(amount=SHELL_2_DEPTH, mode=Mode.SUBTRACT)

    # 草图24 → Extrude 1 2 (add)
    with BuildSketch(Plane.XY.offset(236.5)):
        Polygon((8, 23.5), (8, 25.5), (8, 27.5), (5, 27.5), (5, 25.5), (5, 23.5), align=None)
        Polygon((5, -4.5), (5, -6.5), (5, -7.658100232), (8, -7.658100232), (8, -6.5), (8, -4.5), align=None)
    extrude(amount=-EXTRUDE_1_2_DEPTH)

    # 草图25 → 凸台-拉伸3 (add)
    with BuildSketch(Plane.XY.offset(236.5)):
        with Locations((-13, 25.5)):
            Rectangle(SKETCH_25_W, SKETCH_25_H)
    extrude(amount=-EXTRUDE_3_DEPTH)

    # 草图26 → 切除-拉伸5 (cut, through all)
    with BuildSketch(Plane.XY.offset(236.5)):
        with Locations((-13, 26.45)):
            Rectangle(SKETCH_26_W, SKETCH_26_H)
    extrude(amount=-CUT_EXTRUDE_5_DEPTH, mode=Mode.SUBTRACT)

    # 草图27 → Cut-Extrude 1 2 (cut, two sides: drawn at the far end of the back side and taken through both)
    with BuildSketch(Plane.XY.offset(236.5).offset(-CUT_EXTRUDE_1_2_DEPTH_BACK)):
        with Locations((-13, 24.048715292)):
            Rectangle(SKETCH_27_W, SKETCH_27_H)
    extrude(amount=CUT_EXTRUDE_1_2_DEPTH + CUT_EXTRUDE_1_2_DEPTH_BACK, mode=Mode.SUBTRACT)

    # 草图28 → 切除-拉伸6 (cut)
    with BuildSketch(Plane.XY.offset(236.5)):
        Circle(SKETCH_28_R)
        with BuildLine():
            Line((-26.7, -29.2), (-8.3, -29.2))
            Line((-8.3, -29.2), (-8.3, -10.1))
            ThreePointArc((-8.3, -10.1), (-7.919238816, -9.180761184), (-7, -8.8))
            Line((-7, -8.8), (26.7, -8.8))
            Line((26.7, -8.8), (26.7, 29.2))
            Line((26.7, 29.2), (-26.7, 29.2))
            Line((-26.7, 29.2), (-26.7, -29.2))
        make_face(mode=Mode.SUBTRACT)
    extrude(amount=-CUT_EXTRUDE_6_DEPTH, mode=Mode.SUBTRACT)

    # 圆角3
    fillet_3_edges = [body_2_7.edges().sort_by_distance(p)[0] for p in [
        (-26.7, 29.2, 235.5),
        (26.7, 29.2, 235.5),
        (26.7, -8.8, 235.5),
        (-8.3, -29.2, 235.5),
        (-26.7, -29.2, 235.5),
    ]]
    fillet(fillet_3_edges, radius=FILLET_3_R)


solid = body_2_7.part
